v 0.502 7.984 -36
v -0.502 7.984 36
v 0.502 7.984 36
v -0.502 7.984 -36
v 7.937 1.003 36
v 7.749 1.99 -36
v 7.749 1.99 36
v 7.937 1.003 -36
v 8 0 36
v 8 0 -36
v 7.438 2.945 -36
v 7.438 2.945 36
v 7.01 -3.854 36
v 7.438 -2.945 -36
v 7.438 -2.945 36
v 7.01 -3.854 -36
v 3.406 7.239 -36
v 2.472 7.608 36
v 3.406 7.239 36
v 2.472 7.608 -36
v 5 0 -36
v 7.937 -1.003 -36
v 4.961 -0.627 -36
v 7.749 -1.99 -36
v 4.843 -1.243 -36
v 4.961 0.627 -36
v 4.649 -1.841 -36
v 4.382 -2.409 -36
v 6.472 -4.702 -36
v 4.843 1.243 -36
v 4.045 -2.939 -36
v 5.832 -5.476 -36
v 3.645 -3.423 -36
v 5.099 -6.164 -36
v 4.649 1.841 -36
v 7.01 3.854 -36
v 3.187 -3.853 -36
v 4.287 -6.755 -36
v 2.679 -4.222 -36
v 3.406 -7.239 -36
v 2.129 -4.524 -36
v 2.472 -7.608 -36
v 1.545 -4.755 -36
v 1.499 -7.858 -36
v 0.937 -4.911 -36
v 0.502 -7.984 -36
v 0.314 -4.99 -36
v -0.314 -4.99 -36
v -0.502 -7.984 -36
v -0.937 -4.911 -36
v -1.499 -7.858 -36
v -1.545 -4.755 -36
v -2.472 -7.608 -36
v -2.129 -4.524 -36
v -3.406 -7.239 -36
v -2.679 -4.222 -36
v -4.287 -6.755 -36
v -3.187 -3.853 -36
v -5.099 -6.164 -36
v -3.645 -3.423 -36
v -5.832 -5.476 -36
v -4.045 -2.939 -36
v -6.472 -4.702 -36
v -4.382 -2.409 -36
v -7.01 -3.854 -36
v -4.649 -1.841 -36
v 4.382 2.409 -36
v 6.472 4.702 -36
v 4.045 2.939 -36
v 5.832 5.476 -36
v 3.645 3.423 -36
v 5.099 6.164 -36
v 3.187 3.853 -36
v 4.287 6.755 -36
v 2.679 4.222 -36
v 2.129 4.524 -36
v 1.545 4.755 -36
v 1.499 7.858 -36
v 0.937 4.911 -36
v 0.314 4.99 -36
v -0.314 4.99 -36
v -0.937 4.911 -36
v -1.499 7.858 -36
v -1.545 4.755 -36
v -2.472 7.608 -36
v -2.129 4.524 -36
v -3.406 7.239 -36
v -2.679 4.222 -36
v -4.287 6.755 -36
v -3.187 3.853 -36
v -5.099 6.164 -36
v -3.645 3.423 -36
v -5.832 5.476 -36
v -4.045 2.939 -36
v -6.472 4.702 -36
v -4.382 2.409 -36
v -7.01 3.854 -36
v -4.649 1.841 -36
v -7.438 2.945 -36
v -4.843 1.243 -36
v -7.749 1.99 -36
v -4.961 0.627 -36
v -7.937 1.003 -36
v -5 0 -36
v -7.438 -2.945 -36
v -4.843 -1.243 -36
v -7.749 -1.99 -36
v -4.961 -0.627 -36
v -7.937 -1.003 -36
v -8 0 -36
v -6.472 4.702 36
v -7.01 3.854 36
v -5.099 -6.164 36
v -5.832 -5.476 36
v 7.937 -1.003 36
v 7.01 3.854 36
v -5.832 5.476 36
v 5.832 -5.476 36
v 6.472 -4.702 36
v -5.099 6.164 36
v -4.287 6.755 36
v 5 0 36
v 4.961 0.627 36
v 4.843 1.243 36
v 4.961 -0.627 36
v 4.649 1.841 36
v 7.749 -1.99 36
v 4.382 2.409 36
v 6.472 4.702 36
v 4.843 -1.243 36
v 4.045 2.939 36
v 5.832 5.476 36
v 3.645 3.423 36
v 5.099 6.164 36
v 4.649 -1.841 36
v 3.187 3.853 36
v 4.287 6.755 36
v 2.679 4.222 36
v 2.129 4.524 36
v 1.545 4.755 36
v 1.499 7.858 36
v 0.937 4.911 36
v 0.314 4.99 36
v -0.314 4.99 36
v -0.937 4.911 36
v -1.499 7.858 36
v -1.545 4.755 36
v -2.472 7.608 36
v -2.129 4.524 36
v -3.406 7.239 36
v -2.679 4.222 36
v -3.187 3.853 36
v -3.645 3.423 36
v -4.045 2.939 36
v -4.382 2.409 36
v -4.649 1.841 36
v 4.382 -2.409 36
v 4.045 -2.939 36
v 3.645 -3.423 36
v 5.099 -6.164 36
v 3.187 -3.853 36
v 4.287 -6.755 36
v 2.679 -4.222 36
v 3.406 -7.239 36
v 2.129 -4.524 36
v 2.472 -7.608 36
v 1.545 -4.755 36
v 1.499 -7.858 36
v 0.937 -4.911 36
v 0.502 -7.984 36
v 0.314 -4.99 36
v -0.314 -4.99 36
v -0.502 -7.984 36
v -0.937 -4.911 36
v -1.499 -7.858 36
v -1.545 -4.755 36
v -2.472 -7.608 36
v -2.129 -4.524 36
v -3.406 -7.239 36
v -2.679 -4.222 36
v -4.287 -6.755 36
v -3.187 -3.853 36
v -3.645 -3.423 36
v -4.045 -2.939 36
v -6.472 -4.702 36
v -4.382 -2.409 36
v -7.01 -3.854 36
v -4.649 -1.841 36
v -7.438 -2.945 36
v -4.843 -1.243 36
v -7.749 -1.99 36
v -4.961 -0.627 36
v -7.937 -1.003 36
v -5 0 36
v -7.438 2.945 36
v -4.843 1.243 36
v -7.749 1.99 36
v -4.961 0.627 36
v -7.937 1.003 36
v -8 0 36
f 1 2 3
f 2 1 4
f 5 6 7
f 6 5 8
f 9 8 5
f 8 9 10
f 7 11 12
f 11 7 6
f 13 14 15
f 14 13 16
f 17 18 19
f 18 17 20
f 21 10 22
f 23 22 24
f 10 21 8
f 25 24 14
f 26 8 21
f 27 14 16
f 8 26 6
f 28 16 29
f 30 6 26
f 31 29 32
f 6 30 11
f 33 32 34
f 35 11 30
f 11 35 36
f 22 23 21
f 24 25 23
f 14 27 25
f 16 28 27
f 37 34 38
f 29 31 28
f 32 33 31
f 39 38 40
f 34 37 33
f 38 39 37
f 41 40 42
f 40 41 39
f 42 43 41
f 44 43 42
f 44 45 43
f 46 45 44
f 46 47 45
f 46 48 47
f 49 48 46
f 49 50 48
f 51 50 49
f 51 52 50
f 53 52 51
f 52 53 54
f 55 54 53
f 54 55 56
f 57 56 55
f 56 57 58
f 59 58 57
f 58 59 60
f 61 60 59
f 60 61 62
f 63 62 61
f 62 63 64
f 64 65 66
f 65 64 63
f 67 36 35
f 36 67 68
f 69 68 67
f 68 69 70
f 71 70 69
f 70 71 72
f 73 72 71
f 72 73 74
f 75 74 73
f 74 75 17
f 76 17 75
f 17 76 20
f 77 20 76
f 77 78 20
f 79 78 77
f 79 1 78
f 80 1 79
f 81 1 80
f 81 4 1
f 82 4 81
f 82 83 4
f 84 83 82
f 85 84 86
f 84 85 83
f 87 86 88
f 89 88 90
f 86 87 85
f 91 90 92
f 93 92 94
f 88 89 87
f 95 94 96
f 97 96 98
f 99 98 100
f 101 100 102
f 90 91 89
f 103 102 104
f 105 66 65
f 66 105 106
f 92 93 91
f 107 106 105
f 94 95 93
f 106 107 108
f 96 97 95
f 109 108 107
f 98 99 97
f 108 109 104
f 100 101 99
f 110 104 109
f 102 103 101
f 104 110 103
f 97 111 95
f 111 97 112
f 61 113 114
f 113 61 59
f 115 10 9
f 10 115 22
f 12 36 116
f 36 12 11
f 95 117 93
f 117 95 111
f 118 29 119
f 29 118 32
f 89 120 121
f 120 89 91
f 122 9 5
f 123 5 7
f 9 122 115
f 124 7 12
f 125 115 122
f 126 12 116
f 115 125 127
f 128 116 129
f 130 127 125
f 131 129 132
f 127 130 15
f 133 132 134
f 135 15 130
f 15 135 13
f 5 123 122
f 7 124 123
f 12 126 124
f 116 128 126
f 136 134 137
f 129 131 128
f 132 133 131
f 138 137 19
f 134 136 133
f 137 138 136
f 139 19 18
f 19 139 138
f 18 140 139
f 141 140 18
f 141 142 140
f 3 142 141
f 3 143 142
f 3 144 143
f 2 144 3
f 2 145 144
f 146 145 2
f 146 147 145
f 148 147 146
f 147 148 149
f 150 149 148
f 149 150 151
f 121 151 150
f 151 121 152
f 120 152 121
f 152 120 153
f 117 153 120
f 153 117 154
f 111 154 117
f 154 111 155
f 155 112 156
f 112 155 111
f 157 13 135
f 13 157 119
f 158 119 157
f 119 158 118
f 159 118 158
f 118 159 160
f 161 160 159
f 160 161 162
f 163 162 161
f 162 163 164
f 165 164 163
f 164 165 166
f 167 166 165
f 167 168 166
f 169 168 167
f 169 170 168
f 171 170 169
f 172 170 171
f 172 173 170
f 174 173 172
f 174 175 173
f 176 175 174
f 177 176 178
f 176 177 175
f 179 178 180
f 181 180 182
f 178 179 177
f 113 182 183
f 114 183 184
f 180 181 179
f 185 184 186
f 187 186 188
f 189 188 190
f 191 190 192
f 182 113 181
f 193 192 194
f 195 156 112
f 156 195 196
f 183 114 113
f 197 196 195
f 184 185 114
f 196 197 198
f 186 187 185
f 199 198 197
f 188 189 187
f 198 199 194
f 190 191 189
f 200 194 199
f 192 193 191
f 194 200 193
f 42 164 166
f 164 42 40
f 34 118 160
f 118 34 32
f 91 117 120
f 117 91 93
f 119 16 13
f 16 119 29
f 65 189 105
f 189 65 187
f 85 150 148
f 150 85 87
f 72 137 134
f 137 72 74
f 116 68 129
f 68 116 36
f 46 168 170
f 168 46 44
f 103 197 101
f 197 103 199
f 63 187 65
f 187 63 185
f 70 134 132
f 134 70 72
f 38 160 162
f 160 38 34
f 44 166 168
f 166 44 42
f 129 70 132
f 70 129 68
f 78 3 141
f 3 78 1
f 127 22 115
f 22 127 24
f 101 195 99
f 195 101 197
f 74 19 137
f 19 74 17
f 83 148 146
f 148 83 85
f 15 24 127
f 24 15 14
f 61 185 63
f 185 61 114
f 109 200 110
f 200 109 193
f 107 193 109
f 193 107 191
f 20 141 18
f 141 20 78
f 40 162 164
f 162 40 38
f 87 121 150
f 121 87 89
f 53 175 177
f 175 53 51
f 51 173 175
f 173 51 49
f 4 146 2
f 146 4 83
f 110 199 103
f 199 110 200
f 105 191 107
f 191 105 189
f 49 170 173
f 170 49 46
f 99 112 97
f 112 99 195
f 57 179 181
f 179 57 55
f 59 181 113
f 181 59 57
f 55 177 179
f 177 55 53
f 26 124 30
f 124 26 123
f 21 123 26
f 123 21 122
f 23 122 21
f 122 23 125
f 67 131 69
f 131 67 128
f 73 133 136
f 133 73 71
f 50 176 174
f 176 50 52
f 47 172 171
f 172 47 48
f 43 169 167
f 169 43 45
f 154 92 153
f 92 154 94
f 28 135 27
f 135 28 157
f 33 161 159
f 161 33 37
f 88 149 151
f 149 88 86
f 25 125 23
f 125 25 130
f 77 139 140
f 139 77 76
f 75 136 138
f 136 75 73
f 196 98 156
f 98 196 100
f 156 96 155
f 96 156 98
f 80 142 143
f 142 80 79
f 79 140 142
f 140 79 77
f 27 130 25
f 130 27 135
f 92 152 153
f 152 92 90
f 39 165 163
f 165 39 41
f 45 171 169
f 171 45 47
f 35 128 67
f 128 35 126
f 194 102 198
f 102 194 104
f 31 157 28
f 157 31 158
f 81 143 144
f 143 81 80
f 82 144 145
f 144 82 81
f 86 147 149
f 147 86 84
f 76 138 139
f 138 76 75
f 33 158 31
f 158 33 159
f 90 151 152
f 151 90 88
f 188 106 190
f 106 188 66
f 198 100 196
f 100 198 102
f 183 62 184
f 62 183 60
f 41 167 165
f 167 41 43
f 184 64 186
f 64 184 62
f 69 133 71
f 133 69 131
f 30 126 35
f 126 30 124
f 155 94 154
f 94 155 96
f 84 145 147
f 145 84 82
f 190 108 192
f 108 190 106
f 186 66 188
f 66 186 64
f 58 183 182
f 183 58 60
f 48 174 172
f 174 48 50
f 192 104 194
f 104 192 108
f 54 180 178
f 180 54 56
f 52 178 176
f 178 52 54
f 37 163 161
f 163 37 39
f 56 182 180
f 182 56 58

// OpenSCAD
$fn = 50;


difference() {
	union() {
		translate(v = [0, 0, -36.0000000000]) {
			cylinder(h = 72, r = 8.0000000000);
		}
	}
	union() {
		translate(v = [0, 0, -100.0000000000]) {
			cylinder(h = 200, r = 5.0000000000);
		}
	}
}
